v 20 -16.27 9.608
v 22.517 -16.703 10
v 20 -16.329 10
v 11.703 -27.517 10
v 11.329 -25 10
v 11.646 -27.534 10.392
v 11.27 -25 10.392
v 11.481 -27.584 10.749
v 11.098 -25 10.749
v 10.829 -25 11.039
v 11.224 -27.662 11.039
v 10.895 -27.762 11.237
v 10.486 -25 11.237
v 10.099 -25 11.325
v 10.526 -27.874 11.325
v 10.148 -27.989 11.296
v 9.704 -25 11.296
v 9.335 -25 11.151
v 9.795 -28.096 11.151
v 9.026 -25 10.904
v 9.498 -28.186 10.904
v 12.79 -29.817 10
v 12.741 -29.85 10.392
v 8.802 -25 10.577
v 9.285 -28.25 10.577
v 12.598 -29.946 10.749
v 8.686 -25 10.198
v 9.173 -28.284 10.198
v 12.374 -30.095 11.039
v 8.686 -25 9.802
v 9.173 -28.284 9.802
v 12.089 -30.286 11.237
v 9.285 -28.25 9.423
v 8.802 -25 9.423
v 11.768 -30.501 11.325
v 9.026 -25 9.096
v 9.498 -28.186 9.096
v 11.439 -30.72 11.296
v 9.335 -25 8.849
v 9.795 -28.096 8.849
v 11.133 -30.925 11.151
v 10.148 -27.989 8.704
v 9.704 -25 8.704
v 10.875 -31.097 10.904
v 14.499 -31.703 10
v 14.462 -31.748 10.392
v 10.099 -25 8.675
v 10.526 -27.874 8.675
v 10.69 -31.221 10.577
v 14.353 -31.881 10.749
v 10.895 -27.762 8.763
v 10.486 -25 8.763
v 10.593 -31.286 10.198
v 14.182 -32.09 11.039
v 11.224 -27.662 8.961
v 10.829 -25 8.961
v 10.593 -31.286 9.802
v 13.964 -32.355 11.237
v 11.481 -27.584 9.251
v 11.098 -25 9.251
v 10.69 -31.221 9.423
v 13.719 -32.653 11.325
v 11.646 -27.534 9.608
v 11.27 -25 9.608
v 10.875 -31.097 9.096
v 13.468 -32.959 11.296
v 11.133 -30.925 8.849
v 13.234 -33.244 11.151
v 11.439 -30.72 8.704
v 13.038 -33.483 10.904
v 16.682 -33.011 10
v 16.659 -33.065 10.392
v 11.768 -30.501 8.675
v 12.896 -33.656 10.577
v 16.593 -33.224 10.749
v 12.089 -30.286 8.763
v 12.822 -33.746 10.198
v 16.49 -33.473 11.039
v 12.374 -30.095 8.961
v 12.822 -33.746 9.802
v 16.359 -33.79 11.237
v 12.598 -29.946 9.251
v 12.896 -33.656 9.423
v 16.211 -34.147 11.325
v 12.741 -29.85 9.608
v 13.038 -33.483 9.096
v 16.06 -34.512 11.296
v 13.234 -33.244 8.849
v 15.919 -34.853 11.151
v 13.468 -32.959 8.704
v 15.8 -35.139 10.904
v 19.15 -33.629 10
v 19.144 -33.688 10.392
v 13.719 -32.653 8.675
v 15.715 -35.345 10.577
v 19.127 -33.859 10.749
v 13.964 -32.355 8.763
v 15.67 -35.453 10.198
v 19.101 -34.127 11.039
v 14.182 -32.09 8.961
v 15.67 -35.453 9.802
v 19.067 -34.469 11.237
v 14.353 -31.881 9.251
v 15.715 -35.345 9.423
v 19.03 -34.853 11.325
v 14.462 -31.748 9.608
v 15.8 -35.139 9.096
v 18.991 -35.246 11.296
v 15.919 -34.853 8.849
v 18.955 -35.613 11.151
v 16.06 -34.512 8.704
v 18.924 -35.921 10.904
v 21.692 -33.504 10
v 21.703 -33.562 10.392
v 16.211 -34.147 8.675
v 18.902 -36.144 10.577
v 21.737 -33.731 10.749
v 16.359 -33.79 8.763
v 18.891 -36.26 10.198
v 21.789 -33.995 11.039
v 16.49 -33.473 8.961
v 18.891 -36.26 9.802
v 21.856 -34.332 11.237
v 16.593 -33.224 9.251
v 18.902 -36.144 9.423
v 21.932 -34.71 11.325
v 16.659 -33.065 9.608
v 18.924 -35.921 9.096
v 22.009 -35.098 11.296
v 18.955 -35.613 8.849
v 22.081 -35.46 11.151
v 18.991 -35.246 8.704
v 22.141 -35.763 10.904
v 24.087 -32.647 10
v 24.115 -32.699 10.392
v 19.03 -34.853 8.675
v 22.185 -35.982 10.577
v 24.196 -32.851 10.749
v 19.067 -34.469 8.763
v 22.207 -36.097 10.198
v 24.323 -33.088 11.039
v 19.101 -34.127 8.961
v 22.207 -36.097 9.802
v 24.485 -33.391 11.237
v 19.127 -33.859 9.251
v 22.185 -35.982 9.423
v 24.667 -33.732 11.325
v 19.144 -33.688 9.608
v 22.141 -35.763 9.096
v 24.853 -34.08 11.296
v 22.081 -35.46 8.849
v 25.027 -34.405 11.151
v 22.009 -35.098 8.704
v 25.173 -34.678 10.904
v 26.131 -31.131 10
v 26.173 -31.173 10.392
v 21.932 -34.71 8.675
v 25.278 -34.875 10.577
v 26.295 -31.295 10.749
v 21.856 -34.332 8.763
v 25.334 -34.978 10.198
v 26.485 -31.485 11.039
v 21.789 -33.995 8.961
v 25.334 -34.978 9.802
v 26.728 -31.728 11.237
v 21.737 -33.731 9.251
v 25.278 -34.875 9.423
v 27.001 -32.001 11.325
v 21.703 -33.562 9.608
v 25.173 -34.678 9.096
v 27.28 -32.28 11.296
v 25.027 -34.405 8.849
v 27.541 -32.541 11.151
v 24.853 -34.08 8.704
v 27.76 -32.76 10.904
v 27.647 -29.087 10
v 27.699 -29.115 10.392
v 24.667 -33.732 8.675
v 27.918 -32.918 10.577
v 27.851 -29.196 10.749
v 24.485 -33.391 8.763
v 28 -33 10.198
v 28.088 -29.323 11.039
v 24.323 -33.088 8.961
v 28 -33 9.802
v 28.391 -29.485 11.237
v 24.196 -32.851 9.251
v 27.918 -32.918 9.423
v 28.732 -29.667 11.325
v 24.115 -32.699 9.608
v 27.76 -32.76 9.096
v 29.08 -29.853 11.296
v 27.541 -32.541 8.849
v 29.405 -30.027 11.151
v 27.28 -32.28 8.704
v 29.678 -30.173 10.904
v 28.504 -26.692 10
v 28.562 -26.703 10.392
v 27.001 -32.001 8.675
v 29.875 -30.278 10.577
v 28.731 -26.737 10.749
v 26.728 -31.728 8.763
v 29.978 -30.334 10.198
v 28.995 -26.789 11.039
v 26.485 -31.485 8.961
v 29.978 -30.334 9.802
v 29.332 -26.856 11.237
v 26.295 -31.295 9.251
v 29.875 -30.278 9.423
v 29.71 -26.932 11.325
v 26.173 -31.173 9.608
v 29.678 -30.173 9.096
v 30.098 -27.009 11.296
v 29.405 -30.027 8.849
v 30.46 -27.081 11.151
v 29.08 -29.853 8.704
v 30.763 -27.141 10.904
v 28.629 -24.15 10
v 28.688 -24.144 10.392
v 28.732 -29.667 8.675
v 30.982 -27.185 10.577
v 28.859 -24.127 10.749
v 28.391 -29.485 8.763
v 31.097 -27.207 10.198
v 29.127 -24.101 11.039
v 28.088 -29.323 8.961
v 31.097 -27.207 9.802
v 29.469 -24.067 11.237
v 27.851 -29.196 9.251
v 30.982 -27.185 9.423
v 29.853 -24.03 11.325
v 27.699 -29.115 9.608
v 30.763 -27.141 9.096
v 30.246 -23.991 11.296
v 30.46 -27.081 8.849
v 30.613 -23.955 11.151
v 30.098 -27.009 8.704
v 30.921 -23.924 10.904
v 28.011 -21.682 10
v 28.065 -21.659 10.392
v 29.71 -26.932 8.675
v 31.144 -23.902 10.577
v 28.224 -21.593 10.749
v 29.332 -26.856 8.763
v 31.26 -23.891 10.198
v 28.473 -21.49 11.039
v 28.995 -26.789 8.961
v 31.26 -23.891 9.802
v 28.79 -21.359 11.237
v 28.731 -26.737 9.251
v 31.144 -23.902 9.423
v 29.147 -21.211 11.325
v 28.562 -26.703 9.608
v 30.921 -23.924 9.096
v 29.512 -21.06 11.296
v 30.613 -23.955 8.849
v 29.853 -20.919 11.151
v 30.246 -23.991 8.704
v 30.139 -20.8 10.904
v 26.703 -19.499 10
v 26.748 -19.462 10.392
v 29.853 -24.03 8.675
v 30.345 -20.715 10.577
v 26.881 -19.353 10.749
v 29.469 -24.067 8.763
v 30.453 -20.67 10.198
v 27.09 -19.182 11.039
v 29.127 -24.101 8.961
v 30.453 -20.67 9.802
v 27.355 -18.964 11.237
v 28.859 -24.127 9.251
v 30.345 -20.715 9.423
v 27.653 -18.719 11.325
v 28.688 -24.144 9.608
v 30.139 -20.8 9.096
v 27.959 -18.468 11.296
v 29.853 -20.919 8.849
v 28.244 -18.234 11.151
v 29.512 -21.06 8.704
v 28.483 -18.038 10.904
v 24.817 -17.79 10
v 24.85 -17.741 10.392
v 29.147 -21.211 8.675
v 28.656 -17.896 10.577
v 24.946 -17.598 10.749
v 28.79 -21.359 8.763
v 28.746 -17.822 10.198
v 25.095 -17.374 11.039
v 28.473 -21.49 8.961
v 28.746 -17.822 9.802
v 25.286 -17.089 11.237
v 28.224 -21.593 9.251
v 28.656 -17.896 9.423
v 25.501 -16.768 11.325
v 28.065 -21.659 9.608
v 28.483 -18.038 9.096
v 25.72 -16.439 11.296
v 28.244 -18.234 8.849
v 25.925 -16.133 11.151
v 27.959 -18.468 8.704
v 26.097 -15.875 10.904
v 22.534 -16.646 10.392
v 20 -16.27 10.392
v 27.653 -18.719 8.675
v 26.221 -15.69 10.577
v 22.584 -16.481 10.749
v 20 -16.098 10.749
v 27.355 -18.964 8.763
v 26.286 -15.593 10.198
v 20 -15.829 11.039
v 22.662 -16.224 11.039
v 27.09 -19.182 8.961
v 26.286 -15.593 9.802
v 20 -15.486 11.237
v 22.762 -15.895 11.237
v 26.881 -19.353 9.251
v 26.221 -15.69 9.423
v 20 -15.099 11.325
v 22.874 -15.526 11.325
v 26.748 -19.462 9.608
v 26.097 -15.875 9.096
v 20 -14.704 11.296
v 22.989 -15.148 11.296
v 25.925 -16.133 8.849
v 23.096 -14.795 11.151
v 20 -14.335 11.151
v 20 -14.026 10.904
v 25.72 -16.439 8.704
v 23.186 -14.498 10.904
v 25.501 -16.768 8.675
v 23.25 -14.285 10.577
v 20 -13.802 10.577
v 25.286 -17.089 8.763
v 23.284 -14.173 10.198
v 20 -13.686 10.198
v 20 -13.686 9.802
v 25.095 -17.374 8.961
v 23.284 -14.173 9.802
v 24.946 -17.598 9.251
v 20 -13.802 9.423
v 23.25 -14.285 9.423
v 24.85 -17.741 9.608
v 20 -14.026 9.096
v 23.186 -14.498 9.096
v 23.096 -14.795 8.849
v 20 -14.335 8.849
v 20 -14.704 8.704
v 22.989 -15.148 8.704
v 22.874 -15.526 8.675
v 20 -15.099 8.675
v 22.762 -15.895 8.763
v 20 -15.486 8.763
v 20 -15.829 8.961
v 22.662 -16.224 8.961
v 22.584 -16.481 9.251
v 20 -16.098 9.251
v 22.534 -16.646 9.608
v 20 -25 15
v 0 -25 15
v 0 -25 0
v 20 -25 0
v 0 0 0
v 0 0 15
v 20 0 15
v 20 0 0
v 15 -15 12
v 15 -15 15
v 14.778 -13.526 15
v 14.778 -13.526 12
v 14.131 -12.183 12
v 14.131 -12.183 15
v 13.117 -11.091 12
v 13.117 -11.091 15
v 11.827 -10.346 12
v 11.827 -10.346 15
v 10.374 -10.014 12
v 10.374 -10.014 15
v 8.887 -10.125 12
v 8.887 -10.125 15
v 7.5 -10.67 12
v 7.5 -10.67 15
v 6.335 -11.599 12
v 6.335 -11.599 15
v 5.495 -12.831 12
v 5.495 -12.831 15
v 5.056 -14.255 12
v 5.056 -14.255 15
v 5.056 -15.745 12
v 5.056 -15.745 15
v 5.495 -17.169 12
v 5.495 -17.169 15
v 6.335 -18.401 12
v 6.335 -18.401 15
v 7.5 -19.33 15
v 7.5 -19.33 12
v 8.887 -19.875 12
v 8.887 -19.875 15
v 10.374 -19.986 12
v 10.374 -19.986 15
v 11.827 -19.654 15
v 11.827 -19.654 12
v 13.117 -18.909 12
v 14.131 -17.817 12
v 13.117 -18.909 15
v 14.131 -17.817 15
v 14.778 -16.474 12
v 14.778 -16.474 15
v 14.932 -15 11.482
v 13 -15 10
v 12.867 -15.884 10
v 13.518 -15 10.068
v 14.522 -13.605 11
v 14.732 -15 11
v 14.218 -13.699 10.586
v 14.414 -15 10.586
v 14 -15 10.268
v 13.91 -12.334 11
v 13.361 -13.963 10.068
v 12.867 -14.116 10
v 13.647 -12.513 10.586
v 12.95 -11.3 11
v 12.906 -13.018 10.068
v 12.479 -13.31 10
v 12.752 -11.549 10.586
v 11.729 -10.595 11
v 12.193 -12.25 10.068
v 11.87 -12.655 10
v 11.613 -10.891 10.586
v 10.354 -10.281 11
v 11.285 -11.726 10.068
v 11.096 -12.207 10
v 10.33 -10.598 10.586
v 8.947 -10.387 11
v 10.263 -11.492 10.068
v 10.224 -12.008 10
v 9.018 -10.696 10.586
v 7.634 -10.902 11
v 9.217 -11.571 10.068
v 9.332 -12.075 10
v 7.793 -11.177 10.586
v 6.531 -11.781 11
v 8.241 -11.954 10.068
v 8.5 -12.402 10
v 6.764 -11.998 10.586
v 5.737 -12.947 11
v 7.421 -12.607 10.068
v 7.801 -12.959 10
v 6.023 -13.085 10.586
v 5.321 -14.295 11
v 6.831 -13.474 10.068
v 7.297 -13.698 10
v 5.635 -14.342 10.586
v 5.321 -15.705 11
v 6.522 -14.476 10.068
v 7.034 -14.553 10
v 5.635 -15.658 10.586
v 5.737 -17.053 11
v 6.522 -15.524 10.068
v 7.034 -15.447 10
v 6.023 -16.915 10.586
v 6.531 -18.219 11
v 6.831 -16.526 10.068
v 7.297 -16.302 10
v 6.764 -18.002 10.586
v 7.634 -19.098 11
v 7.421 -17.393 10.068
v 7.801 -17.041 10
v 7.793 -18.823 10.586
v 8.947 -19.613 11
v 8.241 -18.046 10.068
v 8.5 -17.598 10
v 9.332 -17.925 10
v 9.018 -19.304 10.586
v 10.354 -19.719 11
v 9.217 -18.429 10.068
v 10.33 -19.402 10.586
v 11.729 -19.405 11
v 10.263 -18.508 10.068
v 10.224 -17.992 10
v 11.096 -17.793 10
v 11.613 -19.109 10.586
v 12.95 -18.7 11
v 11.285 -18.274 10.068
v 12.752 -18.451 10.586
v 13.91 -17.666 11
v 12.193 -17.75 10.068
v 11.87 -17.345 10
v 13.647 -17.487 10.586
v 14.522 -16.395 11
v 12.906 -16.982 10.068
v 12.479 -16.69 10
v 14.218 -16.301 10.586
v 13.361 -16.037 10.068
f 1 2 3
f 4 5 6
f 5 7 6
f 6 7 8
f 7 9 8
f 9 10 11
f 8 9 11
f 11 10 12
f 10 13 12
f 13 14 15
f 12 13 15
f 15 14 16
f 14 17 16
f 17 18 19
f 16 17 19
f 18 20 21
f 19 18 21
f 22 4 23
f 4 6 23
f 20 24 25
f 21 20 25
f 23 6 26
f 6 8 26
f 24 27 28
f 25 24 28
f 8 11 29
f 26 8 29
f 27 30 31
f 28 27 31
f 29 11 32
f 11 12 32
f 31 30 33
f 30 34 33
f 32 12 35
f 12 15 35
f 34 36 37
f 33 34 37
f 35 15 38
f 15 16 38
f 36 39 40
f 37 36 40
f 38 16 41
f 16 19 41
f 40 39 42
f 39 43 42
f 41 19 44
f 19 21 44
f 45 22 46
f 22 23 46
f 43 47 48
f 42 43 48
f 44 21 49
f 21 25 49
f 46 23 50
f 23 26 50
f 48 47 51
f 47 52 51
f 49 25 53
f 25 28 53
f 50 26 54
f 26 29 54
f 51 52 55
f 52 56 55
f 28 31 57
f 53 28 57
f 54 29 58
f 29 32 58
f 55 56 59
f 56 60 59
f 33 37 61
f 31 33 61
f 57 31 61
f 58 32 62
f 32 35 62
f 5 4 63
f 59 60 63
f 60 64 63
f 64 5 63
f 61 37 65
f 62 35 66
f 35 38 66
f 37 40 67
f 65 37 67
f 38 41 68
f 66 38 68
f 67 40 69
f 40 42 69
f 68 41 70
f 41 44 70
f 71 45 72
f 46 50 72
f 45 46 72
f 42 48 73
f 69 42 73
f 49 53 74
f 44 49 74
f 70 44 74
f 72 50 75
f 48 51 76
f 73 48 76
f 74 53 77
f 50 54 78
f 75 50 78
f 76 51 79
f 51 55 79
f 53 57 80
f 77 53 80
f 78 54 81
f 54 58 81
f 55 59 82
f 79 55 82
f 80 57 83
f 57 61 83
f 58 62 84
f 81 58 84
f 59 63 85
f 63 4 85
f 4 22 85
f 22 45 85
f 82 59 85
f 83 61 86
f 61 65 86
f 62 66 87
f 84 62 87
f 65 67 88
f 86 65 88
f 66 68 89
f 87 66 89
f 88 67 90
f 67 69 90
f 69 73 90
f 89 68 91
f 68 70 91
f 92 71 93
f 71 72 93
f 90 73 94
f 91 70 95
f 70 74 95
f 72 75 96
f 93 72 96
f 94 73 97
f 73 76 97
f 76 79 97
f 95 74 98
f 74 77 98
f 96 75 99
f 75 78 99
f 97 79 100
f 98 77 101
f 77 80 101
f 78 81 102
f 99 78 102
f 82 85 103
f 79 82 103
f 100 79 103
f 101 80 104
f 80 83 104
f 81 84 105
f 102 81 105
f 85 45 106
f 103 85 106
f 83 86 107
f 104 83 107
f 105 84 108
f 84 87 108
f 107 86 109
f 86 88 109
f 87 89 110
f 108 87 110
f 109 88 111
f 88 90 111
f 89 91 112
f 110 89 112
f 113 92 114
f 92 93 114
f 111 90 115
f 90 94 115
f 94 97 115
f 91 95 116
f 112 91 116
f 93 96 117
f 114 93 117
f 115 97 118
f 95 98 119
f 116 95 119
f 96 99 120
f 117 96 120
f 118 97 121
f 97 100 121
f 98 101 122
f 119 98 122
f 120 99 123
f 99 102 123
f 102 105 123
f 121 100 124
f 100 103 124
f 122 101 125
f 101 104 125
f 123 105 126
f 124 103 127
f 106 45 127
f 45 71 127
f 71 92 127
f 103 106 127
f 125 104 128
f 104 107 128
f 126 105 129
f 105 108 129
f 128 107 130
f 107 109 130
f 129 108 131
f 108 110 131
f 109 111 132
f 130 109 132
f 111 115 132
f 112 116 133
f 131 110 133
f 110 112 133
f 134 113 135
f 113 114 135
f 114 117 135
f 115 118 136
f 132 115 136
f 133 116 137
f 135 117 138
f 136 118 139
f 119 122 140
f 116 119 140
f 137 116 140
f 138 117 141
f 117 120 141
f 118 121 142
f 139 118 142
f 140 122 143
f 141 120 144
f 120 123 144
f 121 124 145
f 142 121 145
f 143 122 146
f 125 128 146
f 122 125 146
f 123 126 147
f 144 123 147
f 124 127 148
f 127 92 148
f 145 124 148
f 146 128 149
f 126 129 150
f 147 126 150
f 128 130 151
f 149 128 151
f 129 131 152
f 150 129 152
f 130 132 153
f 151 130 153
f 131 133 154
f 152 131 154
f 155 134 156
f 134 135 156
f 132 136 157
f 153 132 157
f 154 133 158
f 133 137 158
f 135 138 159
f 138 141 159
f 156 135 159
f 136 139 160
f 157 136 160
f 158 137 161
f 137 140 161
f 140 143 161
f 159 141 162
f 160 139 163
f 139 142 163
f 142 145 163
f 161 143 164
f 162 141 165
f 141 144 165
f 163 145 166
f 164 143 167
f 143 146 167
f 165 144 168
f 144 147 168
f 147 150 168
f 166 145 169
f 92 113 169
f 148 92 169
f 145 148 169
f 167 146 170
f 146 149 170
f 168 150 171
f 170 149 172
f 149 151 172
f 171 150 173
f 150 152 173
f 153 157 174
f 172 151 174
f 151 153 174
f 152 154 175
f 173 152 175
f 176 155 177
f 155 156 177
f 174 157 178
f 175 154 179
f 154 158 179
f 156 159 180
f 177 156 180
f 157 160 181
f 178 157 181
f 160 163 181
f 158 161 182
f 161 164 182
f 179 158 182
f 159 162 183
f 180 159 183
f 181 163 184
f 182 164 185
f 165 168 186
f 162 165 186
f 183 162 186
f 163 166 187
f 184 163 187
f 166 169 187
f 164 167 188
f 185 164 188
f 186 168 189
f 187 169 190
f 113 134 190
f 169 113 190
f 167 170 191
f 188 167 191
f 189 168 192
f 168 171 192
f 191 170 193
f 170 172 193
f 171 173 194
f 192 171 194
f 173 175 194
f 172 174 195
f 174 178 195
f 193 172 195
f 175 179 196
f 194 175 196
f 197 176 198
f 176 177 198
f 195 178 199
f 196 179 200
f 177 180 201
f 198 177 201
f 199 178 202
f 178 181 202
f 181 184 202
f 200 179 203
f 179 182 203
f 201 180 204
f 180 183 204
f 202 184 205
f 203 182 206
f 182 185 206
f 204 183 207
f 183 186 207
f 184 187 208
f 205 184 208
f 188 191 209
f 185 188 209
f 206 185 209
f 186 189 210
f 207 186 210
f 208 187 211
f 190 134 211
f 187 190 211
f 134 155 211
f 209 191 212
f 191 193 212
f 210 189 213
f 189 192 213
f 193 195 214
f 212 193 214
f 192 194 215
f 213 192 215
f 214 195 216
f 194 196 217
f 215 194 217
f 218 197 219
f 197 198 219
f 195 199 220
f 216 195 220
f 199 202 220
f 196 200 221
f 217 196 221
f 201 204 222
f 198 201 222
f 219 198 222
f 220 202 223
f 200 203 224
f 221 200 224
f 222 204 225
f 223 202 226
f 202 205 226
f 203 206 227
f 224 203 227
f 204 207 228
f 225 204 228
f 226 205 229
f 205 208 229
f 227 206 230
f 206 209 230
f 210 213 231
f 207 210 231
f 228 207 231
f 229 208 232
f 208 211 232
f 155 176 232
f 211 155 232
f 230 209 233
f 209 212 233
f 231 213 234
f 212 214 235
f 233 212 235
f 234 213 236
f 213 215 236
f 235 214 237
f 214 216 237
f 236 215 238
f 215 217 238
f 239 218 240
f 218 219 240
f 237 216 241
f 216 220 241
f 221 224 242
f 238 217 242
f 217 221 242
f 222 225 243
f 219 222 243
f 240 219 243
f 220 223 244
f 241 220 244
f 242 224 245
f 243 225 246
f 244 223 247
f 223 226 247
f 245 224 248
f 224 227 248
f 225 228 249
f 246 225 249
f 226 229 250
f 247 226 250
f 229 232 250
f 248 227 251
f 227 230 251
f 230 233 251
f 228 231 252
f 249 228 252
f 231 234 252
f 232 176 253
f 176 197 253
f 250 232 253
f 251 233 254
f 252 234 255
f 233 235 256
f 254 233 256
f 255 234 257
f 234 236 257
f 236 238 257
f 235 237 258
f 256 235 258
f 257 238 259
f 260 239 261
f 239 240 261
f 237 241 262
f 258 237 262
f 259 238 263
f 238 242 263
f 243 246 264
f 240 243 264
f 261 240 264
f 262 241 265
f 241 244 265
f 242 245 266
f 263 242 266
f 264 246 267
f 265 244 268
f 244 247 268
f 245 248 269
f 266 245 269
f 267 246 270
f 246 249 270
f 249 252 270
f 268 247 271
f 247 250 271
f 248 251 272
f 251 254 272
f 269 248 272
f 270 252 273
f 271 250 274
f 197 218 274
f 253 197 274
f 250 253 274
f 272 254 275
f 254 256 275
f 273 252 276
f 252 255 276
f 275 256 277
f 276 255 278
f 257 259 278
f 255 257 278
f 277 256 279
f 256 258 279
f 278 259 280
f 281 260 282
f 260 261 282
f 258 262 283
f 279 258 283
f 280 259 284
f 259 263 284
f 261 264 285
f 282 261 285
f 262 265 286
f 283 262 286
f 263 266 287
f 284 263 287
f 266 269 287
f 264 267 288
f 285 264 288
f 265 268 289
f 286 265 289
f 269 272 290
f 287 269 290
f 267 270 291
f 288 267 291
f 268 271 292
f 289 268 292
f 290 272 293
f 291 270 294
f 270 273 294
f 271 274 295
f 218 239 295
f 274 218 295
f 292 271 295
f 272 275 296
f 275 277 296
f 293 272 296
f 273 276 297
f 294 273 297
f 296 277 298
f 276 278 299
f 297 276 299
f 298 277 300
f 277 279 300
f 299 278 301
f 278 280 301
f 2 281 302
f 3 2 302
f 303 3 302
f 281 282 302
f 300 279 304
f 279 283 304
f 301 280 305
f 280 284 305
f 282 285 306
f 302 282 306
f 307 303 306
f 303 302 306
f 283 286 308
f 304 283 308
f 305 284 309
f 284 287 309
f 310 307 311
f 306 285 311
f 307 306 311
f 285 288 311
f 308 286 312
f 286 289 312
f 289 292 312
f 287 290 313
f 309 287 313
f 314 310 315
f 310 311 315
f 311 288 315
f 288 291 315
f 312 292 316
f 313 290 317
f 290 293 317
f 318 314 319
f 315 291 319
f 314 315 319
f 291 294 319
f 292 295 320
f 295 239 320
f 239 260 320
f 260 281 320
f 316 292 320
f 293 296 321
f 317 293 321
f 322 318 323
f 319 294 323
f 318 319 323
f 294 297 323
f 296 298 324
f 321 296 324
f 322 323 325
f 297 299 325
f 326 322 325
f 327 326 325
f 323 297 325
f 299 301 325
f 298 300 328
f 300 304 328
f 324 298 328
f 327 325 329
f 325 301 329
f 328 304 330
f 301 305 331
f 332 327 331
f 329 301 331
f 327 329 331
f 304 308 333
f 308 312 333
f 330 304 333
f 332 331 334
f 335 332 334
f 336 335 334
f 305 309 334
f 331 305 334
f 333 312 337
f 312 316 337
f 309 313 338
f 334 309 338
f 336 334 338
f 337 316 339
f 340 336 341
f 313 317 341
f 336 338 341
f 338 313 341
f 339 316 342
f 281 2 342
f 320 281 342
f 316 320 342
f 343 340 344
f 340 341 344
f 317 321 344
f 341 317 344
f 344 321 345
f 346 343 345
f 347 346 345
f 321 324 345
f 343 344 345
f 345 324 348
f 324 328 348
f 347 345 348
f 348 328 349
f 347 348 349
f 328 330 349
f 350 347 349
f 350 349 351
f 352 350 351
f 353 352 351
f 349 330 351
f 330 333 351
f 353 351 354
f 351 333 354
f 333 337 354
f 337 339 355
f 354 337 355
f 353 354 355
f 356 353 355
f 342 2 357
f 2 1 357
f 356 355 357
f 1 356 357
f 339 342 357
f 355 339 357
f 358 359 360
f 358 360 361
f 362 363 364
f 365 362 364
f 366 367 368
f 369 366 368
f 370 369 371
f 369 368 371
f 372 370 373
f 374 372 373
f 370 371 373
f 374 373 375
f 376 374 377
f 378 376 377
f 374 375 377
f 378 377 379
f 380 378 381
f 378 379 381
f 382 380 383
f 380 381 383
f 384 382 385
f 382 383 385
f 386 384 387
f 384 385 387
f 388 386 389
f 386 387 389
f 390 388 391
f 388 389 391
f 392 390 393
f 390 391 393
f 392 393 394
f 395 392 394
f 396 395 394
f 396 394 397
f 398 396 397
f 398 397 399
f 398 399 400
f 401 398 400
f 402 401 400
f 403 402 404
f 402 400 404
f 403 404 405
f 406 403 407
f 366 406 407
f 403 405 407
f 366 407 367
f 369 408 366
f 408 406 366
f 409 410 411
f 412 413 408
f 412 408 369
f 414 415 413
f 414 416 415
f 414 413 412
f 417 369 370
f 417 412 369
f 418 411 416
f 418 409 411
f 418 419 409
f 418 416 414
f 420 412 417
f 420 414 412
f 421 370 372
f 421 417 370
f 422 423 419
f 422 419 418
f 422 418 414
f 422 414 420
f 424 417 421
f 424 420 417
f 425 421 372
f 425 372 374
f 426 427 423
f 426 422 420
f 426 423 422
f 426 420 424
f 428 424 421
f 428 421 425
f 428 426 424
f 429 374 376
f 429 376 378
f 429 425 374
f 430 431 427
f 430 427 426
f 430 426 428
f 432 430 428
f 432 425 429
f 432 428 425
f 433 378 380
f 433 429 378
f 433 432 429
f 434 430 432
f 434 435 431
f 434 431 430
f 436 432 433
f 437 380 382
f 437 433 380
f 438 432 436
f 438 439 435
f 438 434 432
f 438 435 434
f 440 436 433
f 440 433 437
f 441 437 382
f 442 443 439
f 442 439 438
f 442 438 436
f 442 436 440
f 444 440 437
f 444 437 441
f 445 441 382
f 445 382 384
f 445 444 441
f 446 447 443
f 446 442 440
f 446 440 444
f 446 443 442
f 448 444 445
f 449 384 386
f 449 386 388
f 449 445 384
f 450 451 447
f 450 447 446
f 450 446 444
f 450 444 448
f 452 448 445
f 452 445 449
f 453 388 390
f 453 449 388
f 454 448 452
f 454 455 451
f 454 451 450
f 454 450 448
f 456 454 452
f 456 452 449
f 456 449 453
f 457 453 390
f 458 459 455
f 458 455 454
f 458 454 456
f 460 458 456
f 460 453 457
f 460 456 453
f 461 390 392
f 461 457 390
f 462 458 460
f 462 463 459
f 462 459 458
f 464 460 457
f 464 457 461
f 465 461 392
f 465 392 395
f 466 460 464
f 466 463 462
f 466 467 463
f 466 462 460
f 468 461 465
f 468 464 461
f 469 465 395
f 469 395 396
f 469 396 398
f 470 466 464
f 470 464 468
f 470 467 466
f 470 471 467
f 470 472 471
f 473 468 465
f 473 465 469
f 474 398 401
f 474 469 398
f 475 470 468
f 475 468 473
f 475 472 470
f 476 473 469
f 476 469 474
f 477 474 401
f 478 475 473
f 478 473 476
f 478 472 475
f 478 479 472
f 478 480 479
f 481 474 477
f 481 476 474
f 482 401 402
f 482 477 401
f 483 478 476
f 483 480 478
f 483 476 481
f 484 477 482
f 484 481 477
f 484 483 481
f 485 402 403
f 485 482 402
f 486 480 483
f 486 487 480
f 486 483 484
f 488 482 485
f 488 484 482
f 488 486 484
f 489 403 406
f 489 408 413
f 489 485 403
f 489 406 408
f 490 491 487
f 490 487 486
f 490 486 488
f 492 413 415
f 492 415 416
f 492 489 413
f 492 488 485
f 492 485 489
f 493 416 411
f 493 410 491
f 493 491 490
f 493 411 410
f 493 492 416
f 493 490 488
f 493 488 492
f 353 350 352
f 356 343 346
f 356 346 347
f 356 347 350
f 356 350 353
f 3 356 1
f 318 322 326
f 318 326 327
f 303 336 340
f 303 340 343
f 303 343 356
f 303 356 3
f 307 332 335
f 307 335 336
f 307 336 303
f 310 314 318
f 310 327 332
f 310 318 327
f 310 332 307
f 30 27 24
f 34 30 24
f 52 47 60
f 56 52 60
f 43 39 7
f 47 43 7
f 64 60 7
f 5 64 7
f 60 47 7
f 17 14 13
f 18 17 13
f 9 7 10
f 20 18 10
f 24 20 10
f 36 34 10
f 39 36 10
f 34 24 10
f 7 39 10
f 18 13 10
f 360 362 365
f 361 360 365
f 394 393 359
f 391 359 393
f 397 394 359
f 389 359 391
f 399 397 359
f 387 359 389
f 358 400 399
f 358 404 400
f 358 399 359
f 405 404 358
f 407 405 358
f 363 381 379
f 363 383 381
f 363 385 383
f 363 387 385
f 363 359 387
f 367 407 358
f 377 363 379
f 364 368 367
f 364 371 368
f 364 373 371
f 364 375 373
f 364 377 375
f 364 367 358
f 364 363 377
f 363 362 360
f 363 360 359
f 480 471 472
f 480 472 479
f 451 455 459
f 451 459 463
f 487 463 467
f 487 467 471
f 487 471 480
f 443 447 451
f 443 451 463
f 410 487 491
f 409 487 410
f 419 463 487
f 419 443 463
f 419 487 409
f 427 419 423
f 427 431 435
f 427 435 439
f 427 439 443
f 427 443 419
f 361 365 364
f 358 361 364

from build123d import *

# Parameters (mm, degrees)
F0_W     = 20
F0_H     = 15
F1_DEPTH = 25
F2_R     = 5
F3_DEPTH = 5
F4_R     = 2
F5_R     = 1.3291403614
F6_ANGLE = 270


with BuildPart() as f1:
    # F0 (on Front) → F1 (new body)
    with BuildSketch(Plane.XZ):
        with Locations((10, 7.5)):
            Rectangle(F0_W, F0_H)
    extrude(amount=F1_DEPTH)

    # F2 (on face) → F3 (cut)
    with BuildSketch(Plane.XY.offset(15)):
        with Locations((10, -15)):
            Circle(F2_R)
    extrude(amount=-F3_DEPTH, mode=Mode.SUBTRACT)

    # F4
    f4_edges = [f1.edges().sort_by_distance(p)[0] for p in [
        (5, -15, 10),
    ]]
    fillet(f4_edges, radius=F4_R)


with BuildPart() as f6:
    # F5 (on face) → F6 (revolve)
    with BuildSketch(Plane.XZ.offset(25)):
        with Locations((10, 10)):
            Circle(F5_R)
    revolve(axis=Axis((20, -25, 7.5), (0, 0, 1)), revolution_arc=F6_ANGLE)


solid = Compound([f1.part, f6.part])
